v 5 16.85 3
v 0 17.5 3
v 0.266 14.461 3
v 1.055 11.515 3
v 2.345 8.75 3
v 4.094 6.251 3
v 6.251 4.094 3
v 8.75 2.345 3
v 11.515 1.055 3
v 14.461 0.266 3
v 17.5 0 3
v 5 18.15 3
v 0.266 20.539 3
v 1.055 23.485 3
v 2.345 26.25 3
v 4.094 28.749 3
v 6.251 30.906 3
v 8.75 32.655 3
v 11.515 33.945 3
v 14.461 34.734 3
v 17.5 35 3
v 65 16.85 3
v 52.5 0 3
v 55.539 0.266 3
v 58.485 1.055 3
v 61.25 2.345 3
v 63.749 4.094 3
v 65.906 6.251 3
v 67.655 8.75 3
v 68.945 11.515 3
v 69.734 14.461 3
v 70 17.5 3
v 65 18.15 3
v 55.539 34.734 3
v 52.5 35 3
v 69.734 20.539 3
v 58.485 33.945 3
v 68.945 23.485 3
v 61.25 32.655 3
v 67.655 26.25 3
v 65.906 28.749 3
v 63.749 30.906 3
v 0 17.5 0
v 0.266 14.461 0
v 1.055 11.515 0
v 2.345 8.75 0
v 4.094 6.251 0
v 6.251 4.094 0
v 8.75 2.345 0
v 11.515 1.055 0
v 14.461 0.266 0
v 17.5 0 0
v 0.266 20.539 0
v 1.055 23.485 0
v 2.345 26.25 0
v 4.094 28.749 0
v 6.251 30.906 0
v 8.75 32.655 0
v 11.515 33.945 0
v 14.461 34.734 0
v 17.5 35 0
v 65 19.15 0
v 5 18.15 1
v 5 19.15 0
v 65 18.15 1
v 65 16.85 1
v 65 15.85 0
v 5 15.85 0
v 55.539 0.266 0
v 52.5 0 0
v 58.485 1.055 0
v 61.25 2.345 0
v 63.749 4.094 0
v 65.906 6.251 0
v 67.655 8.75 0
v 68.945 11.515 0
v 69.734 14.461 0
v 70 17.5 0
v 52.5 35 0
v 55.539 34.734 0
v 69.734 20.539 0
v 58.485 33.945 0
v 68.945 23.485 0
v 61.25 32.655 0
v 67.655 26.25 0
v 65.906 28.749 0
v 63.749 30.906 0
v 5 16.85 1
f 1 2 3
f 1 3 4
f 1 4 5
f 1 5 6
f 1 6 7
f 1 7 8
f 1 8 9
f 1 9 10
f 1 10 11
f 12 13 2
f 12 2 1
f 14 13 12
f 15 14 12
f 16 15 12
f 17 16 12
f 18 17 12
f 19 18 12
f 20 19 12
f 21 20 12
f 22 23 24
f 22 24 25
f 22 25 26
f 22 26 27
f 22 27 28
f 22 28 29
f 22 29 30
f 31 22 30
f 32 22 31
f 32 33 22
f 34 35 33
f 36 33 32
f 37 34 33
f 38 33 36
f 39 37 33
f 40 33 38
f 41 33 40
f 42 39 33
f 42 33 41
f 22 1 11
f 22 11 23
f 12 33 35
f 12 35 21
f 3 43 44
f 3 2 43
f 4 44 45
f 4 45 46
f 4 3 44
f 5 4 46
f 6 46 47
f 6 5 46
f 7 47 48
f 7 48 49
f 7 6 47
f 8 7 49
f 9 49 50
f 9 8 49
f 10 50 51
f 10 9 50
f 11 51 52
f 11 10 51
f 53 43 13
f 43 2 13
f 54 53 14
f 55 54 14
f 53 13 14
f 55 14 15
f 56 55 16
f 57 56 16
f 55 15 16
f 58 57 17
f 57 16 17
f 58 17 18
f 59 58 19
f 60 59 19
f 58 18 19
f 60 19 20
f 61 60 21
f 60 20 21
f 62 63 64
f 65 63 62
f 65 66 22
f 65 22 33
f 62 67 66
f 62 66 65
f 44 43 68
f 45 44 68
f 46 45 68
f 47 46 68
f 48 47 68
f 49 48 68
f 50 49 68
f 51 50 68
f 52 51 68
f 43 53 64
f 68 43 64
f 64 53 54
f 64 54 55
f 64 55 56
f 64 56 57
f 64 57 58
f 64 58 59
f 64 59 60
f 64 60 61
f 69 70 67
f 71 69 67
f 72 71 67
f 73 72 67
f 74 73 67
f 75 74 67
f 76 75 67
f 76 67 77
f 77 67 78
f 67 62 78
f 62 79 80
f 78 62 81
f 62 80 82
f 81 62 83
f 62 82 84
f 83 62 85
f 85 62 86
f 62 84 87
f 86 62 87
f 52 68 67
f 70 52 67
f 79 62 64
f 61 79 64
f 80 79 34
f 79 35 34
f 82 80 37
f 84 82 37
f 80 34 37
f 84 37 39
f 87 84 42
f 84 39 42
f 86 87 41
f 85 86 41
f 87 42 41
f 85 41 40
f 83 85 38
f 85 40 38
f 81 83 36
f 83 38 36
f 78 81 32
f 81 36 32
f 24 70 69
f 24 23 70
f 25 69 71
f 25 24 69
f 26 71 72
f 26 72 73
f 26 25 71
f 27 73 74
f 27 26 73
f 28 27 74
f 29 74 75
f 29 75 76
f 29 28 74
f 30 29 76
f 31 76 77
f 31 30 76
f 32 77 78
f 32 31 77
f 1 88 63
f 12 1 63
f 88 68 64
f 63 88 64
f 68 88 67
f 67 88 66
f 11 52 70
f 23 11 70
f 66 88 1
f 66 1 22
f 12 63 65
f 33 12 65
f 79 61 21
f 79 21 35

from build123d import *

# Parameters (mm, degrees)
F0_W     = 70
F0_H     = 35
F0_W_2   = 60
F0_H_2   = 1.3
F1_DEPTH = 3
F2_R     = 17.49999
F3_SIZE  = 1


# Not quite as in the source:
# - a fillet or chamfer is up to 0.001 mm smaller than in the source, because OpenCascade refuses the exact size


with BuildPart() as f1:
    # F0 (on Top) → F1 (new body)
    with BuildSketch(Plane.XY):
        with Locations((35, 17.5)):
            Rectangle(F0_W, F0_H)
        with Locations((35, 17.5)):
            Rectangle(F0_W_2, F0_H_2, mode=Mode.SUBTRACT)
    extrude(amount=F1_DEPTH)

    # F2 (radius 17.5 in the source; OpenCascade refuses exactly that, so slightly less here)
    f2_edges = [f1.edges().sort_by_distance(p)[0] for p in [
        (70, 0, 1.5),
        (70, 35, 1.5),
        (0, 35, 1.5),
        (0, 0, 1.5),
    ]]
    fillet(f2_edges, radius=F2_R)

    # F3
    f3_edges = [f1.edges().sort_by_distance(p)[0] for p in [
        (35, 16.85, 0),
        (35, 18.15, 0),
    ]]
    chamfer(f3_edges, length=F3_SIZE)


solid = f1.part
